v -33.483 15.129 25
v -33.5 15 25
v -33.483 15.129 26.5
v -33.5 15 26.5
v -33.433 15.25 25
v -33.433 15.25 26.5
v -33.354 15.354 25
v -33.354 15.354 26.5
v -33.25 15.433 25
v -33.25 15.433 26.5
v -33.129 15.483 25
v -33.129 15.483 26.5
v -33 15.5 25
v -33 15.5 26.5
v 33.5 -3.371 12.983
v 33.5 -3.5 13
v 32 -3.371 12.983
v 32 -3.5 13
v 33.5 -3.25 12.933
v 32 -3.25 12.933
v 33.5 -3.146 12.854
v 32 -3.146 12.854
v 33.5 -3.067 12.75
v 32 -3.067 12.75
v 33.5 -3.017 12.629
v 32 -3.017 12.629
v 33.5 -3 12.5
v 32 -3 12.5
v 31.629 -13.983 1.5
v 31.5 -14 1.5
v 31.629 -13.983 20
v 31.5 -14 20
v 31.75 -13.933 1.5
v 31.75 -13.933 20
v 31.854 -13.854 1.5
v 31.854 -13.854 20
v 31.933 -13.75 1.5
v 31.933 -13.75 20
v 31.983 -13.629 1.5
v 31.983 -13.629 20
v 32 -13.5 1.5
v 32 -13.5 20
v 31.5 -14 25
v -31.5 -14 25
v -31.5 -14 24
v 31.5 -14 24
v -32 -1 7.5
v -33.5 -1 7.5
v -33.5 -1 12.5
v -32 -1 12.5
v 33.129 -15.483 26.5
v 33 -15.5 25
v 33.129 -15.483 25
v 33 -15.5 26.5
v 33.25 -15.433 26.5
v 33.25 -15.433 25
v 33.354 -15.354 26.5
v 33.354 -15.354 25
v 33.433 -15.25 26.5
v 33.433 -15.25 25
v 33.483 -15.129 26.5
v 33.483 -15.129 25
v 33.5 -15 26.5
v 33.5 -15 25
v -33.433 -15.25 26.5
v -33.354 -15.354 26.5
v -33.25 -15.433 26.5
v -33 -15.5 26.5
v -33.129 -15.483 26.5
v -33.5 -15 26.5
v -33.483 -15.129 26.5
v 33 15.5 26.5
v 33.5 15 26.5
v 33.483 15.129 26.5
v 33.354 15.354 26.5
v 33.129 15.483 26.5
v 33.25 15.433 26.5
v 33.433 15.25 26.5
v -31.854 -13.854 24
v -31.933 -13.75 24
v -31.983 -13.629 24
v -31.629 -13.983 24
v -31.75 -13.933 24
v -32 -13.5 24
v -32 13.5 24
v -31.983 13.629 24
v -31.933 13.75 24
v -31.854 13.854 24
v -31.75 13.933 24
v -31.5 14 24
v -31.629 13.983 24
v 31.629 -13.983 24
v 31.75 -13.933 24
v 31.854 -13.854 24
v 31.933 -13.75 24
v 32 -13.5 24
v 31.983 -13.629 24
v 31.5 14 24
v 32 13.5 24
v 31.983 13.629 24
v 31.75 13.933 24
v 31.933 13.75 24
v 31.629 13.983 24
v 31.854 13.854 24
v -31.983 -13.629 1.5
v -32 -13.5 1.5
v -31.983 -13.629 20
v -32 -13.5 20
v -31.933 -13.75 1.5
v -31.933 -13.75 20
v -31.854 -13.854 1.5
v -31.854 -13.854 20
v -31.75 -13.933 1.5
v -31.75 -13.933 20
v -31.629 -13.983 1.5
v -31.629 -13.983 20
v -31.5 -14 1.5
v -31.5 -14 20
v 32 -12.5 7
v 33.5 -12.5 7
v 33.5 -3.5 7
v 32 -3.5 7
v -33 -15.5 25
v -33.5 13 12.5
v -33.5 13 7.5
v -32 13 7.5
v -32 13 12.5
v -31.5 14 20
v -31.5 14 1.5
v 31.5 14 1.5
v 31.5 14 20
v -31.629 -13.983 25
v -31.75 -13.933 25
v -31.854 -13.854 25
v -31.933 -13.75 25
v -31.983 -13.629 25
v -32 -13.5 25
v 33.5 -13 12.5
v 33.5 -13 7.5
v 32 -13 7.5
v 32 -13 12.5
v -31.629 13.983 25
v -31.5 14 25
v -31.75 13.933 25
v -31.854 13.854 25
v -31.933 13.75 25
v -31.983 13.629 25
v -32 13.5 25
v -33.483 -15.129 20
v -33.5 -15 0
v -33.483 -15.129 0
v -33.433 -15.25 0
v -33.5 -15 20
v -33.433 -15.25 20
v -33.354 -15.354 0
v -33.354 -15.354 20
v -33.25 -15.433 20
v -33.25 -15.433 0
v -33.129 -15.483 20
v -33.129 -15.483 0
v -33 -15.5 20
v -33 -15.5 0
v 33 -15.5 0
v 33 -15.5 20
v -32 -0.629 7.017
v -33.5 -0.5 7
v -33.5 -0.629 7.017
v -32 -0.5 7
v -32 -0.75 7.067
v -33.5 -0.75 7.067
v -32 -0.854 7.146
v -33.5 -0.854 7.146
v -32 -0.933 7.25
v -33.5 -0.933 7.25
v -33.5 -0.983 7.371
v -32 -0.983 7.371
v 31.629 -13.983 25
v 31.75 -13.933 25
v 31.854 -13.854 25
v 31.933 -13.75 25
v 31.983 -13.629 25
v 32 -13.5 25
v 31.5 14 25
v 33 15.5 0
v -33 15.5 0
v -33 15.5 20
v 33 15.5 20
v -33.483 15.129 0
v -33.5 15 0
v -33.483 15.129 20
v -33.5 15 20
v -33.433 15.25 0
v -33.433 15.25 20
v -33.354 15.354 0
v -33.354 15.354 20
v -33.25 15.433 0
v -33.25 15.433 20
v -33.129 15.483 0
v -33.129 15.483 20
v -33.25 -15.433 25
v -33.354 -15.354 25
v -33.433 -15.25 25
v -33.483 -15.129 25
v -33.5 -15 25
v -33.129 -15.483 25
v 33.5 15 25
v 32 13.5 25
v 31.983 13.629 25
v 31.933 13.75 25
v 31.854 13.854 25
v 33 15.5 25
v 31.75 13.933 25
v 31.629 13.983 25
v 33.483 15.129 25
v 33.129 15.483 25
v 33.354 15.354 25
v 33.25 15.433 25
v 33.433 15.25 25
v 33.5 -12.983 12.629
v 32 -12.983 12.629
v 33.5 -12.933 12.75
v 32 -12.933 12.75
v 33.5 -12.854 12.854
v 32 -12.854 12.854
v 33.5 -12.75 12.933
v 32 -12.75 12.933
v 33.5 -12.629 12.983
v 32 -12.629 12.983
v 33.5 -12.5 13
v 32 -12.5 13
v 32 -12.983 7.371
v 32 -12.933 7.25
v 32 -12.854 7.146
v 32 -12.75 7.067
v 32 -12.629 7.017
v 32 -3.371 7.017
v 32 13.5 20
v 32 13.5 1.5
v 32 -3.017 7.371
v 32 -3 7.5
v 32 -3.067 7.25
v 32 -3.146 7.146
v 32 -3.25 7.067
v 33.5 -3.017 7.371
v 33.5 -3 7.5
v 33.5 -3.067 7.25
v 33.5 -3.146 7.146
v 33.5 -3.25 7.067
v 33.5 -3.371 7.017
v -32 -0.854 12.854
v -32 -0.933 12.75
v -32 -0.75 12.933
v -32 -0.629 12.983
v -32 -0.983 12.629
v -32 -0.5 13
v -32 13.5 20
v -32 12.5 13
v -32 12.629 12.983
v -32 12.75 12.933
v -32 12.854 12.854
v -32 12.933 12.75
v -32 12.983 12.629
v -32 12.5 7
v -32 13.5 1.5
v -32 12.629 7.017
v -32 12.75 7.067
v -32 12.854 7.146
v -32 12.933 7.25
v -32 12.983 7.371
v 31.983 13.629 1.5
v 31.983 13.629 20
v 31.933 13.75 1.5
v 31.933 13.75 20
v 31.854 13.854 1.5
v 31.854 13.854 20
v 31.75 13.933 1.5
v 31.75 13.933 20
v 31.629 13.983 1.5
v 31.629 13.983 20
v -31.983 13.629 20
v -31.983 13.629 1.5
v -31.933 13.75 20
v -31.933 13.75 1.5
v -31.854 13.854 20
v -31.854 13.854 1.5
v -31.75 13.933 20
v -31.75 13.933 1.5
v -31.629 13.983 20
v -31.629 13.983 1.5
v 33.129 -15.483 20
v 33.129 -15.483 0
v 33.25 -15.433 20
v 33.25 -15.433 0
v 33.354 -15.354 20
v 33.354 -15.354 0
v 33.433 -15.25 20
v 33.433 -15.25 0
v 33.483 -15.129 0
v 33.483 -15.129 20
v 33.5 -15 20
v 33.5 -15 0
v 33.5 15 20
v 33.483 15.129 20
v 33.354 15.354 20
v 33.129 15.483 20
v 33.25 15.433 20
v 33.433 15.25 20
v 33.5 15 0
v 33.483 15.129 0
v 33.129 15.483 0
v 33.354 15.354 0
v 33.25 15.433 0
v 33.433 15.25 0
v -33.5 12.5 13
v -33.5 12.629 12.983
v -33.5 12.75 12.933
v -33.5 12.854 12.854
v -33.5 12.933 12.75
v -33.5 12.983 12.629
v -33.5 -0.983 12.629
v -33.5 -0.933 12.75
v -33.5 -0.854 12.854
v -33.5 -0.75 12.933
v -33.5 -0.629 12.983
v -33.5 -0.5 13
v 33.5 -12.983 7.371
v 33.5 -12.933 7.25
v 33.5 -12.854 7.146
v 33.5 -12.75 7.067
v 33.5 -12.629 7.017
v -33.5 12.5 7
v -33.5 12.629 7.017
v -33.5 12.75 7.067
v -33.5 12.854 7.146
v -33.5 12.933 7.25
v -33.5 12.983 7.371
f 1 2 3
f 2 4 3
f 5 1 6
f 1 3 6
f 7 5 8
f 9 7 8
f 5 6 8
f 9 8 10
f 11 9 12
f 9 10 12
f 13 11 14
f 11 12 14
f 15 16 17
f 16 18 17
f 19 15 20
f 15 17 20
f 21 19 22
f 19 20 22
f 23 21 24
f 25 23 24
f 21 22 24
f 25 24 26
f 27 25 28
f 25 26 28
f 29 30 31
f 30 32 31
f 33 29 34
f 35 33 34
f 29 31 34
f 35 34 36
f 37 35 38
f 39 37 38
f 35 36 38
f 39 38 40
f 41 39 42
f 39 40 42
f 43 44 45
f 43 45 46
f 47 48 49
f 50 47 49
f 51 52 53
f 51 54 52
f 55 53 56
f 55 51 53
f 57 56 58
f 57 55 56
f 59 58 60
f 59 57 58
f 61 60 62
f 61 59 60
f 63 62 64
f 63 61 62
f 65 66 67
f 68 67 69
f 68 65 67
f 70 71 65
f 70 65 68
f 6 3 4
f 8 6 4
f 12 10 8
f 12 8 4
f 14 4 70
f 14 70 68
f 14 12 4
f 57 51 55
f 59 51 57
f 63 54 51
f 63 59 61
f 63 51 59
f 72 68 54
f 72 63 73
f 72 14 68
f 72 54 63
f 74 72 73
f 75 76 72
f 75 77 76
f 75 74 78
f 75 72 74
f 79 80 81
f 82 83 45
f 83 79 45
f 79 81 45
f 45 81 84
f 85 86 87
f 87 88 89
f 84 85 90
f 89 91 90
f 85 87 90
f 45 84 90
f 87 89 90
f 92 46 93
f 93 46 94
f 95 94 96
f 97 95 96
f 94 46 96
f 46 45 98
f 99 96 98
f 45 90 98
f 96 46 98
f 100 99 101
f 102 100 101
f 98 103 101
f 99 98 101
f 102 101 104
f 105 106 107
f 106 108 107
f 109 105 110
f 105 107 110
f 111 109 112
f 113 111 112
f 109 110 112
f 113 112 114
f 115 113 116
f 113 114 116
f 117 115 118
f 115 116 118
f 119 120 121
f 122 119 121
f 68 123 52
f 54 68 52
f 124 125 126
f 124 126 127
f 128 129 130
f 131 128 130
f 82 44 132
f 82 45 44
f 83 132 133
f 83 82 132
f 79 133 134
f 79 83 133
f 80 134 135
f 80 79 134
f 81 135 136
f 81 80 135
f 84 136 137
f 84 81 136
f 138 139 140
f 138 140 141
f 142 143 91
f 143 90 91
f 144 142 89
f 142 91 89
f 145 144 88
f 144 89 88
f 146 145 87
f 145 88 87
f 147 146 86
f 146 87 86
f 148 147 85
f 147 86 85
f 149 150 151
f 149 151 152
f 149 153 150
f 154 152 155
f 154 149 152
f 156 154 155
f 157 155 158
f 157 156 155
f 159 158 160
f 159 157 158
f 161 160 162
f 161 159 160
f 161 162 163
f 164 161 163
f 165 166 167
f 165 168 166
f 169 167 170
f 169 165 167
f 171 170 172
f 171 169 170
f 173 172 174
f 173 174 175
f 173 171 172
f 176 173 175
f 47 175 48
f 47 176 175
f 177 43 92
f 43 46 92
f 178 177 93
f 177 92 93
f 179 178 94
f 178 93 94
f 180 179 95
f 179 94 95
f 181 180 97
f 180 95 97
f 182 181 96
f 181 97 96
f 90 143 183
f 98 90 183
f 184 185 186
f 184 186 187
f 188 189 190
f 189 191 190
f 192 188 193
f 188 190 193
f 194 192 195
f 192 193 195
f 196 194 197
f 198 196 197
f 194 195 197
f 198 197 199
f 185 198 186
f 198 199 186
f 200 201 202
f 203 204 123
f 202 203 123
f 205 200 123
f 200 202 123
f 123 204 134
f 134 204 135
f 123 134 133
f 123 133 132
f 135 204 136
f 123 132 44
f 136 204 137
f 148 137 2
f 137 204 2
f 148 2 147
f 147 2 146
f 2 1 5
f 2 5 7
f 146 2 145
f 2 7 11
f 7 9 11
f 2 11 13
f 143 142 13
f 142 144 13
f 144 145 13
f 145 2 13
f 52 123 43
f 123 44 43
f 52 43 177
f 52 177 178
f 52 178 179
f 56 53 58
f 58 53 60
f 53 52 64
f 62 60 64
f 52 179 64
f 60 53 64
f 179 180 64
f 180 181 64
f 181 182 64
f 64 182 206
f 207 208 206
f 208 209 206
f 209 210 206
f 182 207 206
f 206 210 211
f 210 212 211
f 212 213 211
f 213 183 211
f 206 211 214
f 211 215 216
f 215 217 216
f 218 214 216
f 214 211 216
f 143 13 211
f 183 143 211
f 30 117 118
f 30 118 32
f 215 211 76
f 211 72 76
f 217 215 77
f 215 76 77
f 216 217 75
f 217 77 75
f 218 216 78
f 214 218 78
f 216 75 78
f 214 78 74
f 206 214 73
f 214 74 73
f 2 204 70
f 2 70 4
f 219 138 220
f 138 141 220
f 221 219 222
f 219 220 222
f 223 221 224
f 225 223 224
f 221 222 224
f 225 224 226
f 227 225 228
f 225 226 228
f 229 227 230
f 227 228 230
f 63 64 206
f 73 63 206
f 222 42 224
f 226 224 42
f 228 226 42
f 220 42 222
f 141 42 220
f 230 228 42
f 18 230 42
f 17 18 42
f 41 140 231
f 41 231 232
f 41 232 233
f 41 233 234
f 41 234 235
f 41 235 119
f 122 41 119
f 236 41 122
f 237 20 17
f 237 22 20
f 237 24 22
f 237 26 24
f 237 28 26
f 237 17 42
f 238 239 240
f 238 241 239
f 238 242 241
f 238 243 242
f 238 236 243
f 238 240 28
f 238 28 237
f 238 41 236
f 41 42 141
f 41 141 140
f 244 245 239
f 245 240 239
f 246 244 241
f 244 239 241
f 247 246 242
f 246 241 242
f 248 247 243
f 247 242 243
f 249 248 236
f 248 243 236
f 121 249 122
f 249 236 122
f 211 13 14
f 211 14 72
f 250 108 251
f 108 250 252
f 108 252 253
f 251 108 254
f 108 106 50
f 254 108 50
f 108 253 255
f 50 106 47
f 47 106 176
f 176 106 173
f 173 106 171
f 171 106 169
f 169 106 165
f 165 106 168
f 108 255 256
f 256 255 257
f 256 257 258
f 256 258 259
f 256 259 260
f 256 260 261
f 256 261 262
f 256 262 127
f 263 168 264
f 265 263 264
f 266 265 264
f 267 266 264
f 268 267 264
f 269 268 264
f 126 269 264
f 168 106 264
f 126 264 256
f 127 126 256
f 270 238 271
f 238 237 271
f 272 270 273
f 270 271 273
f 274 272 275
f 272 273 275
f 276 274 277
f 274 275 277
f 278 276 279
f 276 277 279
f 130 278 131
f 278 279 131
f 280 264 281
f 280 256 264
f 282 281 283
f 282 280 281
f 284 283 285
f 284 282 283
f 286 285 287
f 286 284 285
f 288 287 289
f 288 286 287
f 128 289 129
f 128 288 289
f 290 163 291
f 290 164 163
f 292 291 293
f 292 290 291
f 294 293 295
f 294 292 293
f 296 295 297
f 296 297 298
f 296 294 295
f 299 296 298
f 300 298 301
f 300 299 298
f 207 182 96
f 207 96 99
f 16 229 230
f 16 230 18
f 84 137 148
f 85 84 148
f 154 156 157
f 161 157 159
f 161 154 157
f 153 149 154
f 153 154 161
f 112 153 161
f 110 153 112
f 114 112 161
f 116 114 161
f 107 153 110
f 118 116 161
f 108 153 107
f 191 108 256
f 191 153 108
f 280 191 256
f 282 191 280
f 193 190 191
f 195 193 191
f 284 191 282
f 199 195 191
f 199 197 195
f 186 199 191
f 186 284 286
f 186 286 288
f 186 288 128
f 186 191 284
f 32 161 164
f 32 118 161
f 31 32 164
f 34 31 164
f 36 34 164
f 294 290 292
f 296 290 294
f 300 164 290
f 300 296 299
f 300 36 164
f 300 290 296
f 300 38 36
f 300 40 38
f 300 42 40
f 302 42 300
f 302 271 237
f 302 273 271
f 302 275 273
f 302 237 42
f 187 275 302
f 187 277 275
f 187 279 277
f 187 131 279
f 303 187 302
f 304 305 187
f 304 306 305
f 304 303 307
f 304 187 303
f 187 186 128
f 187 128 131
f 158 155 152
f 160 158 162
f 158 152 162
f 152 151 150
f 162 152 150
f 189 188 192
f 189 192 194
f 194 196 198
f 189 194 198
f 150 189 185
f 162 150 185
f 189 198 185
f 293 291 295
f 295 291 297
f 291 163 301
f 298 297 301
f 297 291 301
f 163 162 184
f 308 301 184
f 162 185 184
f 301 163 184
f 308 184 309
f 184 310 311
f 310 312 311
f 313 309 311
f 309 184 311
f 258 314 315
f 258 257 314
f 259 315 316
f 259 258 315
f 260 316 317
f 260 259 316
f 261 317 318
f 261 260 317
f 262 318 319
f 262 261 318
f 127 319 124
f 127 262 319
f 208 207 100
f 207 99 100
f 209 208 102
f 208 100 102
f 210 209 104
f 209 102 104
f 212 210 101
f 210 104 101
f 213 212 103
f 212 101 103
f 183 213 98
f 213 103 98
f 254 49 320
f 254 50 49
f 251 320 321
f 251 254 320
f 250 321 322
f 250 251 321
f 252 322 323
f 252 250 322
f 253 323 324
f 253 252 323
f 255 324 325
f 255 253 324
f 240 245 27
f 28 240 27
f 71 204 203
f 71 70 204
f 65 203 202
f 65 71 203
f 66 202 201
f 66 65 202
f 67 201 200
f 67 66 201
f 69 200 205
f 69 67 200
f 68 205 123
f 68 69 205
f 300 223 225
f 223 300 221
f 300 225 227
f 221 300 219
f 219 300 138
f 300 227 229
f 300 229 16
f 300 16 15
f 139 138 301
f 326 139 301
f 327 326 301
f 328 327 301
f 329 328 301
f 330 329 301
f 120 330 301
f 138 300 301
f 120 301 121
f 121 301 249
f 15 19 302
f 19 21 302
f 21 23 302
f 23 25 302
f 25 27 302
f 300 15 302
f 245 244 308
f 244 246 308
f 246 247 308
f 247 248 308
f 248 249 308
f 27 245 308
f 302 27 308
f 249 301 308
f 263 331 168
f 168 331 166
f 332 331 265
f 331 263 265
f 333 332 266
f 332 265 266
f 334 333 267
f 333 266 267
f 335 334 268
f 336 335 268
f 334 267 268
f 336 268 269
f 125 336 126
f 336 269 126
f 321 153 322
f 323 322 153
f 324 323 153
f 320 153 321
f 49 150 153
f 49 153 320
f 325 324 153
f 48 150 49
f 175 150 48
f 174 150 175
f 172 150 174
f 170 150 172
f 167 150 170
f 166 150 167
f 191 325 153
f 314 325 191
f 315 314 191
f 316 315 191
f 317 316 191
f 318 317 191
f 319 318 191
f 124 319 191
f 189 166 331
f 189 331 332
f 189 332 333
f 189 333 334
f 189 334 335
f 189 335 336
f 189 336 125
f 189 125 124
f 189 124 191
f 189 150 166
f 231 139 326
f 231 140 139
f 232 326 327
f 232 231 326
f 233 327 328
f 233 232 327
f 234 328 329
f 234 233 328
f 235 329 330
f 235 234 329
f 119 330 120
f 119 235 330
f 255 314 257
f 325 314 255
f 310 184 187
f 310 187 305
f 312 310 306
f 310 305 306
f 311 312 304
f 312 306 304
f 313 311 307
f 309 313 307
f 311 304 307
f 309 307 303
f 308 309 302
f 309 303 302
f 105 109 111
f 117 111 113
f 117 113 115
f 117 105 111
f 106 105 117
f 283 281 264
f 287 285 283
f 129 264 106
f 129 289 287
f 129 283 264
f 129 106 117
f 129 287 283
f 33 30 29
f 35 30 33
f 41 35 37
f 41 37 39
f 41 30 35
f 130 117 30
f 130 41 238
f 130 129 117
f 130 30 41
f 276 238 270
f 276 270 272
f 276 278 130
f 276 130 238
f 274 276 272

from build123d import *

# Parameters (mm, degrees)
F0_W      = 64
F0_H      = 28
F1_DEPTH  = 1.5
F0_W_2    = 67
F0_H_2    = 31
F2_DEPTH  = 20
F3_W      = 10
F3_H      = 6
F4_DEPTH  = 25
F5_W      = 14
F5_H      = 6
F6_DEPTH  = 25
F7_R      = 0.5
F8_R      = 0.5
F10_W     = 67
F10_H     = 31
F10_W_2   = 64
F10_H_2   = 28
F11_DEPTH = 1.5
F12_DEPTH = 1
F13_R     = 0.5


# Not quite as in the source:
# - a feature names something its author has since deleted; it is built from what else it names


with BuildPart() as f1:
    # F0 (on Top) → F1 (new body)
    with BuildSketch(Plane.XY):
        Rectangle(F0_W, F0_H)
    extrude(amount=F1_DEPTH)

    # F0 (on Top) → F2 (join)
    with BuildSketch(Plane.XY):
        Rectangle(F0_W_2, F0_H_2)
        Rectangle(F0_W, F0_H, mode=Mode.SUBTRACT)
    extrude(amount=F2_DEPTH)

    # F3 (on face) → F4 (cut)
    with BuildSketch(Plane.YZ.offset(33.5)):
        with Locations((-8, 10)):
            Rectangle(F3_W, F3_H)
    extrude(amount=-F4_DEPTH, mode=Mode.SUBTRACT)

    # F5 (on face) → F6 (cut)
    with BuildSketch(Plane(origin=(-33.5, 0, 0), x_dir=(0, -1, 0), z_dir=(-1, 0, 0))):
        with Locations((-6, 10)):
            Rectangle(F5_W, F5_H)
    extrude(amount=-F6_DEPTH, mode=Mode.SUBTRACT)

    # F7
    f7_edges = [f1.edges().sort_by_distance(p)[0] for p in [
        (-32.75, 13, 13),
        (-32.75, 13, 7),
        (-32.75, -1, 13),
        (-32.75, -1, 7),
        (32.75, -13, 13),
        (32.75, -3, 13),
        (32.75, -13, 7),
        (32.75, -3, 7),
    ]]
    fillet(f7_edges, radius=F7_R)

    # F8
    f8_edges = [f1.edges().sort_by_distance(p)[0] for p in [
        (-33.5, -15.5, 10),
        (-33.5, 15.5, 10),
        (33.5, -15.5, 10),
        (33.5, 15.5, 10),
        (32, -14, 10.75),
        (-32, -14, 10.75),
        (-32, 14, 10.75),
        (32, 14, 10.75),
    ]]
    fillet(f8_edges, radius=F8_R)


with BuildPart() as f11:
    # F10 (on offset) → F11 (new body)
    with BuildSketch(Plane.XY.offset(25)):
        Rectangle(F10_W, F10_H)
        Rectangle(F10_W_2, F10_H_2, mode=Mode.SUBTRACT)
        Rectangle(F10_W_2, F10_H_2)
    extrude(amount=F11_DEPTH)

    # F10 (on offset) → F12 (join)
    with BuildSketch(Plane.XY.offset(25)):
        Rectangle(F10_W_2, F10_H_2)
    extrude(amount=-F12_DEPTH)

    # F13
    f13_edges = [f11.edges().sort_by_distance(p)[0] for p in [
        (-32, -14, 24.5),
        (-33.5, -15.5, 25.75),
        (-32, 14, 24.5),
        (-33.5, 15.5, 25.75),
        (32, 14, 24.5),
        (33.5, 15.5, 25.75),
        (32, -14, 24.5),
        (33.5, -15.5, 25.75),
    ]]
    fillet(f13_edges, radius=F13_R)


solid = Compound([f1.part, f11.part])
